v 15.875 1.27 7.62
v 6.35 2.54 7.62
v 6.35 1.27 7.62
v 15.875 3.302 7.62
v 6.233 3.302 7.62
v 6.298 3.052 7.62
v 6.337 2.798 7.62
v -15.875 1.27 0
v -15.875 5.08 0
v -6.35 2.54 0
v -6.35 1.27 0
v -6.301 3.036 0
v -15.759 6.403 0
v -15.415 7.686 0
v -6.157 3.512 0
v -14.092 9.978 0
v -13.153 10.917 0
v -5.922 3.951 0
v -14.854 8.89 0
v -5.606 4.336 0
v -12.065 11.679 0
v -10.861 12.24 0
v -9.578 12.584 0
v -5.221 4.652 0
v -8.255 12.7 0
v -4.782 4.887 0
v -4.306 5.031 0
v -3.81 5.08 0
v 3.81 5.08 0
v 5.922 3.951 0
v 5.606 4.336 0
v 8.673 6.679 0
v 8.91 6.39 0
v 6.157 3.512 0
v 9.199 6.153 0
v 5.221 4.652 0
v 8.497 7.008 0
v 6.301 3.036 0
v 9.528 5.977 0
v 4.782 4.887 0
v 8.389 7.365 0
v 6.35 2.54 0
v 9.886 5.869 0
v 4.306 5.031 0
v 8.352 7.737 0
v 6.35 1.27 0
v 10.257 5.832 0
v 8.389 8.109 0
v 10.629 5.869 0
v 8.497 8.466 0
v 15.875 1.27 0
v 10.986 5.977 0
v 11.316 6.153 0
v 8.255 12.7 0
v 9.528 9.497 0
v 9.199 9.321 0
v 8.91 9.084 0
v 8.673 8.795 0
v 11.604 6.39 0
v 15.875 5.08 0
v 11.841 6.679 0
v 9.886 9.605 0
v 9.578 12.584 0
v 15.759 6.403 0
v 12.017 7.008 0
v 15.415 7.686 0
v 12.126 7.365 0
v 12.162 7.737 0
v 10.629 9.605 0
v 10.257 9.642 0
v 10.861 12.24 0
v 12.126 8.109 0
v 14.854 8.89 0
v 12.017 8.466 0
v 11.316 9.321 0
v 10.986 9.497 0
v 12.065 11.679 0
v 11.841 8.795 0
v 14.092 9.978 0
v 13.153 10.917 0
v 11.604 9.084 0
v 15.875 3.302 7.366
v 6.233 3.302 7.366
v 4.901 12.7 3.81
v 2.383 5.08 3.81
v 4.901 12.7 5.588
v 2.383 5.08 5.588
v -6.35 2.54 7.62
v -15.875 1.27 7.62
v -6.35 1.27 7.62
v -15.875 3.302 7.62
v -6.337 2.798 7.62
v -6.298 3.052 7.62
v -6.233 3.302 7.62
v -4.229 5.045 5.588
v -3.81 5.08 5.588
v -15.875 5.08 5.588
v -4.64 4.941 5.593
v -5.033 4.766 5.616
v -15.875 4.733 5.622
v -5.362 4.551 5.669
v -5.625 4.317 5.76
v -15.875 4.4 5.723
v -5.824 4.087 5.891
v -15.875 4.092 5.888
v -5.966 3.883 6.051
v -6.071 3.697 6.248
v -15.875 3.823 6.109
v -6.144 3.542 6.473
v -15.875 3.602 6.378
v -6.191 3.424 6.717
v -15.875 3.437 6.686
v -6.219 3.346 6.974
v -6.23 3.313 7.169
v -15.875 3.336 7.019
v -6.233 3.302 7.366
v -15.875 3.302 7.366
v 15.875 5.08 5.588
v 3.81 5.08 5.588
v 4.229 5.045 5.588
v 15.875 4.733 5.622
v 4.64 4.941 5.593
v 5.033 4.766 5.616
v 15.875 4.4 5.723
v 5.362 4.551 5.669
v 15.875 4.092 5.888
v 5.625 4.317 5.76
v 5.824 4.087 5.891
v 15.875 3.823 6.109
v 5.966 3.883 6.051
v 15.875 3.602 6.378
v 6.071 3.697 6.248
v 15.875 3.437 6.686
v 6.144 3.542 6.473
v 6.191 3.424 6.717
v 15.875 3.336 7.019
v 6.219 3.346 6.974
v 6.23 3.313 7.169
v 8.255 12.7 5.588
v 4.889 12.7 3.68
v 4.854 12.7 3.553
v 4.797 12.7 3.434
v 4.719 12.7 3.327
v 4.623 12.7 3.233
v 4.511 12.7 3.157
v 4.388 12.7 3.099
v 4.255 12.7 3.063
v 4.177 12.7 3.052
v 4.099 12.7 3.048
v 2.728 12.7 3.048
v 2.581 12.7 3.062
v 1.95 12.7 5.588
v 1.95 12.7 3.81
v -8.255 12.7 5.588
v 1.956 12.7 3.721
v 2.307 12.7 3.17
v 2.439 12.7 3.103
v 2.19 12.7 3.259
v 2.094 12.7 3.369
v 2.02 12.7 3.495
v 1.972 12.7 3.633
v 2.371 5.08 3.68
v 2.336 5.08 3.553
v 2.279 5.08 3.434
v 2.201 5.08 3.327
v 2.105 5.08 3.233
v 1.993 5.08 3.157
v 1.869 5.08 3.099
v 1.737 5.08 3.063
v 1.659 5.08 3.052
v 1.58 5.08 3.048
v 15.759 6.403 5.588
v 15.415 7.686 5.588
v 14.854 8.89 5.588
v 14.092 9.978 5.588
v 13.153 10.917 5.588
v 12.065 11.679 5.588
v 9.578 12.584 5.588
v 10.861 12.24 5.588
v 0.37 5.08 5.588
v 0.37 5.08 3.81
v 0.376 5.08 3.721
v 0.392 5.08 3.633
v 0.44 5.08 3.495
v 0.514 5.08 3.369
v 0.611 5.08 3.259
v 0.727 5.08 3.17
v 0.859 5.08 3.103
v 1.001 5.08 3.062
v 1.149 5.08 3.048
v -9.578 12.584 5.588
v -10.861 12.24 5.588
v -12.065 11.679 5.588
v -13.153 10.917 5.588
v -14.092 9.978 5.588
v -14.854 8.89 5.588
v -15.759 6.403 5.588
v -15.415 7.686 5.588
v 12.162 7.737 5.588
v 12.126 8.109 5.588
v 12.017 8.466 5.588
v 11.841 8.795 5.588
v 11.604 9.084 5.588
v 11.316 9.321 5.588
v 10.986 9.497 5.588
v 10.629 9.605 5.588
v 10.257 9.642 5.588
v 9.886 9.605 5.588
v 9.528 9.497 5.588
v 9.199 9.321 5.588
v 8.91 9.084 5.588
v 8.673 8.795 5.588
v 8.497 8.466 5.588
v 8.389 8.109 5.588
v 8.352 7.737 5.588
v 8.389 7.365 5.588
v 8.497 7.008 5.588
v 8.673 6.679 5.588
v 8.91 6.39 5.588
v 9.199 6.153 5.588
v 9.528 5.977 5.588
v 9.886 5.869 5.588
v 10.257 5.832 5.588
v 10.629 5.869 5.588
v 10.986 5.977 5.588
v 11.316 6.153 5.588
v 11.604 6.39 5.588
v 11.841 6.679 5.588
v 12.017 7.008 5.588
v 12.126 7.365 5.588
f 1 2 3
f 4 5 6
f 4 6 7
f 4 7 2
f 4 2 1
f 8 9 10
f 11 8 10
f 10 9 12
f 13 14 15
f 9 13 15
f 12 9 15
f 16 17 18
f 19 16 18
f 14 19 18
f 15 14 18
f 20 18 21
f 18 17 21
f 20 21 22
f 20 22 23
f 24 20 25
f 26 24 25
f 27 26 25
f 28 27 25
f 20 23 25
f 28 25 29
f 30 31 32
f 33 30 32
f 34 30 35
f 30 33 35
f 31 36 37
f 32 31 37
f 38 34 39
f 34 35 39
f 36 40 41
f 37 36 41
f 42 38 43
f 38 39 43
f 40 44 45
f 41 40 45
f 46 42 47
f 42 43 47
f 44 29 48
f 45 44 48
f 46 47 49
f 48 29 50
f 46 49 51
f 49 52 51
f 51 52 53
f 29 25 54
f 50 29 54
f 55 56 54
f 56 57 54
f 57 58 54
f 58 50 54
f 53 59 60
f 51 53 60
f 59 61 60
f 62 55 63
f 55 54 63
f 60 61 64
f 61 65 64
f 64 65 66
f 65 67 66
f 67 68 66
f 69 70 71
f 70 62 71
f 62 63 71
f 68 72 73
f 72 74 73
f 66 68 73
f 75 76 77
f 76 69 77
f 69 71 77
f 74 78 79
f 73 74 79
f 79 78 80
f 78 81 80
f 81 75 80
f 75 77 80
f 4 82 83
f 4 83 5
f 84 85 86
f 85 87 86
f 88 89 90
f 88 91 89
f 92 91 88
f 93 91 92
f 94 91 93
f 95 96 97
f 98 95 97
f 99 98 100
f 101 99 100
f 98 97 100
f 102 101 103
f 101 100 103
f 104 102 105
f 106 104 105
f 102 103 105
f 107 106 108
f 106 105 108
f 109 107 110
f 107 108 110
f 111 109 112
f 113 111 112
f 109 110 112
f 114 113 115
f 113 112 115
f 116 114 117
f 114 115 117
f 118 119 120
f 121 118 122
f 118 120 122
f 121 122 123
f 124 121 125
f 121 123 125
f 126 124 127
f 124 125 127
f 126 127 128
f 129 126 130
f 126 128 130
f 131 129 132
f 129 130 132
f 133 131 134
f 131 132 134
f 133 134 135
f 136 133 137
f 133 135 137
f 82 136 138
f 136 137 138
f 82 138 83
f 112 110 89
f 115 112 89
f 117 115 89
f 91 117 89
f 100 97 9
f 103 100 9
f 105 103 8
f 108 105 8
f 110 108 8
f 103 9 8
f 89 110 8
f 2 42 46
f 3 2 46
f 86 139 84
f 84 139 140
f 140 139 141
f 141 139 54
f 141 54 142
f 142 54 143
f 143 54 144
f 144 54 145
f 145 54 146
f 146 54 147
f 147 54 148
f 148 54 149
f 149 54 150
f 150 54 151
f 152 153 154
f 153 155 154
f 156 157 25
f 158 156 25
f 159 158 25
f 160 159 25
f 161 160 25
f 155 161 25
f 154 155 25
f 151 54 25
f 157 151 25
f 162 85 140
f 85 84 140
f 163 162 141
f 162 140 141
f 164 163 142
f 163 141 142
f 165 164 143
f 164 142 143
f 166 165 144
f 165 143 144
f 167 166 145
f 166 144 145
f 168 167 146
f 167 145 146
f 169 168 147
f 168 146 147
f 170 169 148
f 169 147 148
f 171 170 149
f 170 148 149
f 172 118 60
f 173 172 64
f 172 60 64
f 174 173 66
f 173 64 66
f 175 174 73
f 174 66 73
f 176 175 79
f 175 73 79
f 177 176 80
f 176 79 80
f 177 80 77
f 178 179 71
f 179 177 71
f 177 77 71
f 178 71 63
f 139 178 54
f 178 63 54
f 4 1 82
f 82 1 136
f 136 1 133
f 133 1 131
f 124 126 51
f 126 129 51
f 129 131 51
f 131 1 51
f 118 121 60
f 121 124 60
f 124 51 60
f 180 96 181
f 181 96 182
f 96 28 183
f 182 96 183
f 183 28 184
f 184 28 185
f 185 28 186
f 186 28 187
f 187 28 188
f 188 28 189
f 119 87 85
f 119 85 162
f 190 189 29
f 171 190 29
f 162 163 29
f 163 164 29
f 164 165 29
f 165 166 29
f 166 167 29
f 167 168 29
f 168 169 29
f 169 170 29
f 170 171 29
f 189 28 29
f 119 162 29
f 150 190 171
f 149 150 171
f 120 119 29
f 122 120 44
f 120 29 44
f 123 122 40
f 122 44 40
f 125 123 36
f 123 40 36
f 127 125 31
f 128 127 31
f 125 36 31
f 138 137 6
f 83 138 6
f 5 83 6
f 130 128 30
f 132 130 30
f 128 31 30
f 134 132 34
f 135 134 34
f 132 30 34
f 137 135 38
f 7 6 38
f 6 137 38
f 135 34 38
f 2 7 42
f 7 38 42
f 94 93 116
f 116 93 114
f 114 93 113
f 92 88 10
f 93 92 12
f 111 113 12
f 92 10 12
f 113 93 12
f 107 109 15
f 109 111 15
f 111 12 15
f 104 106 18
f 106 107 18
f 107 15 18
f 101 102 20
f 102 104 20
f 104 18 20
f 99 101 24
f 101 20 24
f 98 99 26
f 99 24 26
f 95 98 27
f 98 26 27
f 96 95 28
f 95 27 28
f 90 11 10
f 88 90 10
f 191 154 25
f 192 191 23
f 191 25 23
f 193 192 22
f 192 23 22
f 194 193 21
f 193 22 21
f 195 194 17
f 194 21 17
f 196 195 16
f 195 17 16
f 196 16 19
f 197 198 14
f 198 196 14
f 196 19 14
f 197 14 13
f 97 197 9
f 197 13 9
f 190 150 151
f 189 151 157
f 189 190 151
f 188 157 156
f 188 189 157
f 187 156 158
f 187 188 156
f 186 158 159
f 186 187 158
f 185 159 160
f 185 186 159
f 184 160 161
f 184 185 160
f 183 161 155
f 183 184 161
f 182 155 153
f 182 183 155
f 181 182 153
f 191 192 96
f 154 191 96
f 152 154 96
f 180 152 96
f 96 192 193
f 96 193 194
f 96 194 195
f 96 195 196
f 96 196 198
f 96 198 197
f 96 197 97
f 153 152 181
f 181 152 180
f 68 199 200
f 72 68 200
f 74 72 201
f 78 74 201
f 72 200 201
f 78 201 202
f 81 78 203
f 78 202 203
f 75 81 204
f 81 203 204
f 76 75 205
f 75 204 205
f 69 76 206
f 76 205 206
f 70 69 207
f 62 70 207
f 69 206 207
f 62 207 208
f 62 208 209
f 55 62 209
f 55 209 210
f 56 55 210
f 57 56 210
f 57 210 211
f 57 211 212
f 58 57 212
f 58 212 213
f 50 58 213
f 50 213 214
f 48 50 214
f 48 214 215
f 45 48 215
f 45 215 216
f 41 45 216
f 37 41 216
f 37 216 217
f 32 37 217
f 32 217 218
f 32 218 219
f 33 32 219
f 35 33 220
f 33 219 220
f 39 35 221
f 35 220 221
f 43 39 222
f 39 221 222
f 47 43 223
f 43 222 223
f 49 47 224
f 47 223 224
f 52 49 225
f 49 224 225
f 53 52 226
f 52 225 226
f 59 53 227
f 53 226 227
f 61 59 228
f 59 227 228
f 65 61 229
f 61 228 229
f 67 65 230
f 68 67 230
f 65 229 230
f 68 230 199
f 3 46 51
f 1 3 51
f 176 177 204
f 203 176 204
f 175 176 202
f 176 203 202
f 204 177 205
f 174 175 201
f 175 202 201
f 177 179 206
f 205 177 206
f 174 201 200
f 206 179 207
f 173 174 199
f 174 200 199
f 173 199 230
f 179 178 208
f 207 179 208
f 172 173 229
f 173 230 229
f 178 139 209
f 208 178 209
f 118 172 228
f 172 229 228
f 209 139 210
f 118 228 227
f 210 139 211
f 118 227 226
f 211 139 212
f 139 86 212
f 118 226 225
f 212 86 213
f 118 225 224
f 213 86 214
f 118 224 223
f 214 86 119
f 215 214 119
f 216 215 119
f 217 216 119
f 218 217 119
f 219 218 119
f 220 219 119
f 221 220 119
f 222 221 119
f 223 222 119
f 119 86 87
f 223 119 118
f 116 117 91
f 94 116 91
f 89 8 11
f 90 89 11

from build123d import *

# Parameters (mm, degrees)
F1_DEPTH = 7.62
F3_DEPTH = 4.572
F4_R     = 0.762
F5_R     = 1.905
F6_DEPTH = 7.621
F8_DEPTH = 31.751


with BuildPart() as f1:
    # F0 (on Top) → F1 (new body)
    with BuildSketch(Plane.XY):
        with BuildLine():
            ThreePointArc((-6.35, 2.54), (-5.6060512242, 4.3360512242), (-3.81, 5.08))
            Line((-3.81, 5.08), (3.81, 5.08))
            ThreePointArc((3.81, 5.08), (5.6060512242, 4.3360512242), (6.35, 2.54))
            Line((6.35, 2.54), (6.35, 1.27))
            Line((6.35, 1.27), (15.875, 1.27))
            Line((15.875, 1.27), (15.875, 5.08))
            ThreePointArc((15.875, 5.08), (13.6431536726, 10.4681536726), (8.255, 12.7))
            Line((8.255, 12.7), (-8.255, 12.7))
            ThreePointArc((-8.255, 12.7), (-13.6431536726, 10.4681536726), (-15.875, 5.08))
            Line((-15.875, 5.08), (-15.875, 1.27))
            Line((-15.875, 1.27), (-6.35, 1.27))
            Line((-6.35, 1.27), (-6.35, 2.54))
        make_face()
    extrude(amount=F1_DEPTH)

    # F2 (on face) → F3 (cut)
    with BuildSketch(Plane.XY.offset(7.62)):
        Polygon((2.153245525, 13.6789603775), (0.3542888121, 5.0024012453), (2.1943775111, 4.5093509644), (4.9747148636, 12.9229499468), align=None)
    extrude(amount=-F3_DEPTH, mode=Mode.SUBTRACT)

    # F4
    f4_edges = [f1.edges().sort_by_distance(p)[0] for p in [
        (1.160325, 8.89, 3.048),
        (3.641996, 8.89, 3.048),
    ]]
    fillet(f4_edges, radius=F4_R)

    # F5 (on face) → F6 (cut, through all)
    with BuildSketch(Plane.XY.offset(7.62)):
        with Locations((10.2573568001, 7.736901287)):
            Circle(F5_R)
    extrude(amount=-F6_DEPTH, mode=Mode.SUBTRACT)

    # F7 (on face) → F8 (cut, through all)
    with BuildSketch(Plane(origin=(-15.875, 0, 0), x_dir=(0, -1, 0), z_dir=(-1, 0, 0))):
        with BuildLine():
            Line((-3.302, 7.62), (-12.7, 7.62))
            Line((-12.7, 7.62), (-12.7, 5.588))
            Line((-12.7, 5.588), (-5.08, 5.588))
            ThreePointArc((-5.08, 5.588), (-3.8227641431, 6.1087641431), (-3.302, 7.366))
            Line((-3.302, 7.366), (-3.302, 7.62))
        make_face()
    extrude(amount=-F8_DEPTH, mode=Mode.SUBTRACT)


solid = f1.part
